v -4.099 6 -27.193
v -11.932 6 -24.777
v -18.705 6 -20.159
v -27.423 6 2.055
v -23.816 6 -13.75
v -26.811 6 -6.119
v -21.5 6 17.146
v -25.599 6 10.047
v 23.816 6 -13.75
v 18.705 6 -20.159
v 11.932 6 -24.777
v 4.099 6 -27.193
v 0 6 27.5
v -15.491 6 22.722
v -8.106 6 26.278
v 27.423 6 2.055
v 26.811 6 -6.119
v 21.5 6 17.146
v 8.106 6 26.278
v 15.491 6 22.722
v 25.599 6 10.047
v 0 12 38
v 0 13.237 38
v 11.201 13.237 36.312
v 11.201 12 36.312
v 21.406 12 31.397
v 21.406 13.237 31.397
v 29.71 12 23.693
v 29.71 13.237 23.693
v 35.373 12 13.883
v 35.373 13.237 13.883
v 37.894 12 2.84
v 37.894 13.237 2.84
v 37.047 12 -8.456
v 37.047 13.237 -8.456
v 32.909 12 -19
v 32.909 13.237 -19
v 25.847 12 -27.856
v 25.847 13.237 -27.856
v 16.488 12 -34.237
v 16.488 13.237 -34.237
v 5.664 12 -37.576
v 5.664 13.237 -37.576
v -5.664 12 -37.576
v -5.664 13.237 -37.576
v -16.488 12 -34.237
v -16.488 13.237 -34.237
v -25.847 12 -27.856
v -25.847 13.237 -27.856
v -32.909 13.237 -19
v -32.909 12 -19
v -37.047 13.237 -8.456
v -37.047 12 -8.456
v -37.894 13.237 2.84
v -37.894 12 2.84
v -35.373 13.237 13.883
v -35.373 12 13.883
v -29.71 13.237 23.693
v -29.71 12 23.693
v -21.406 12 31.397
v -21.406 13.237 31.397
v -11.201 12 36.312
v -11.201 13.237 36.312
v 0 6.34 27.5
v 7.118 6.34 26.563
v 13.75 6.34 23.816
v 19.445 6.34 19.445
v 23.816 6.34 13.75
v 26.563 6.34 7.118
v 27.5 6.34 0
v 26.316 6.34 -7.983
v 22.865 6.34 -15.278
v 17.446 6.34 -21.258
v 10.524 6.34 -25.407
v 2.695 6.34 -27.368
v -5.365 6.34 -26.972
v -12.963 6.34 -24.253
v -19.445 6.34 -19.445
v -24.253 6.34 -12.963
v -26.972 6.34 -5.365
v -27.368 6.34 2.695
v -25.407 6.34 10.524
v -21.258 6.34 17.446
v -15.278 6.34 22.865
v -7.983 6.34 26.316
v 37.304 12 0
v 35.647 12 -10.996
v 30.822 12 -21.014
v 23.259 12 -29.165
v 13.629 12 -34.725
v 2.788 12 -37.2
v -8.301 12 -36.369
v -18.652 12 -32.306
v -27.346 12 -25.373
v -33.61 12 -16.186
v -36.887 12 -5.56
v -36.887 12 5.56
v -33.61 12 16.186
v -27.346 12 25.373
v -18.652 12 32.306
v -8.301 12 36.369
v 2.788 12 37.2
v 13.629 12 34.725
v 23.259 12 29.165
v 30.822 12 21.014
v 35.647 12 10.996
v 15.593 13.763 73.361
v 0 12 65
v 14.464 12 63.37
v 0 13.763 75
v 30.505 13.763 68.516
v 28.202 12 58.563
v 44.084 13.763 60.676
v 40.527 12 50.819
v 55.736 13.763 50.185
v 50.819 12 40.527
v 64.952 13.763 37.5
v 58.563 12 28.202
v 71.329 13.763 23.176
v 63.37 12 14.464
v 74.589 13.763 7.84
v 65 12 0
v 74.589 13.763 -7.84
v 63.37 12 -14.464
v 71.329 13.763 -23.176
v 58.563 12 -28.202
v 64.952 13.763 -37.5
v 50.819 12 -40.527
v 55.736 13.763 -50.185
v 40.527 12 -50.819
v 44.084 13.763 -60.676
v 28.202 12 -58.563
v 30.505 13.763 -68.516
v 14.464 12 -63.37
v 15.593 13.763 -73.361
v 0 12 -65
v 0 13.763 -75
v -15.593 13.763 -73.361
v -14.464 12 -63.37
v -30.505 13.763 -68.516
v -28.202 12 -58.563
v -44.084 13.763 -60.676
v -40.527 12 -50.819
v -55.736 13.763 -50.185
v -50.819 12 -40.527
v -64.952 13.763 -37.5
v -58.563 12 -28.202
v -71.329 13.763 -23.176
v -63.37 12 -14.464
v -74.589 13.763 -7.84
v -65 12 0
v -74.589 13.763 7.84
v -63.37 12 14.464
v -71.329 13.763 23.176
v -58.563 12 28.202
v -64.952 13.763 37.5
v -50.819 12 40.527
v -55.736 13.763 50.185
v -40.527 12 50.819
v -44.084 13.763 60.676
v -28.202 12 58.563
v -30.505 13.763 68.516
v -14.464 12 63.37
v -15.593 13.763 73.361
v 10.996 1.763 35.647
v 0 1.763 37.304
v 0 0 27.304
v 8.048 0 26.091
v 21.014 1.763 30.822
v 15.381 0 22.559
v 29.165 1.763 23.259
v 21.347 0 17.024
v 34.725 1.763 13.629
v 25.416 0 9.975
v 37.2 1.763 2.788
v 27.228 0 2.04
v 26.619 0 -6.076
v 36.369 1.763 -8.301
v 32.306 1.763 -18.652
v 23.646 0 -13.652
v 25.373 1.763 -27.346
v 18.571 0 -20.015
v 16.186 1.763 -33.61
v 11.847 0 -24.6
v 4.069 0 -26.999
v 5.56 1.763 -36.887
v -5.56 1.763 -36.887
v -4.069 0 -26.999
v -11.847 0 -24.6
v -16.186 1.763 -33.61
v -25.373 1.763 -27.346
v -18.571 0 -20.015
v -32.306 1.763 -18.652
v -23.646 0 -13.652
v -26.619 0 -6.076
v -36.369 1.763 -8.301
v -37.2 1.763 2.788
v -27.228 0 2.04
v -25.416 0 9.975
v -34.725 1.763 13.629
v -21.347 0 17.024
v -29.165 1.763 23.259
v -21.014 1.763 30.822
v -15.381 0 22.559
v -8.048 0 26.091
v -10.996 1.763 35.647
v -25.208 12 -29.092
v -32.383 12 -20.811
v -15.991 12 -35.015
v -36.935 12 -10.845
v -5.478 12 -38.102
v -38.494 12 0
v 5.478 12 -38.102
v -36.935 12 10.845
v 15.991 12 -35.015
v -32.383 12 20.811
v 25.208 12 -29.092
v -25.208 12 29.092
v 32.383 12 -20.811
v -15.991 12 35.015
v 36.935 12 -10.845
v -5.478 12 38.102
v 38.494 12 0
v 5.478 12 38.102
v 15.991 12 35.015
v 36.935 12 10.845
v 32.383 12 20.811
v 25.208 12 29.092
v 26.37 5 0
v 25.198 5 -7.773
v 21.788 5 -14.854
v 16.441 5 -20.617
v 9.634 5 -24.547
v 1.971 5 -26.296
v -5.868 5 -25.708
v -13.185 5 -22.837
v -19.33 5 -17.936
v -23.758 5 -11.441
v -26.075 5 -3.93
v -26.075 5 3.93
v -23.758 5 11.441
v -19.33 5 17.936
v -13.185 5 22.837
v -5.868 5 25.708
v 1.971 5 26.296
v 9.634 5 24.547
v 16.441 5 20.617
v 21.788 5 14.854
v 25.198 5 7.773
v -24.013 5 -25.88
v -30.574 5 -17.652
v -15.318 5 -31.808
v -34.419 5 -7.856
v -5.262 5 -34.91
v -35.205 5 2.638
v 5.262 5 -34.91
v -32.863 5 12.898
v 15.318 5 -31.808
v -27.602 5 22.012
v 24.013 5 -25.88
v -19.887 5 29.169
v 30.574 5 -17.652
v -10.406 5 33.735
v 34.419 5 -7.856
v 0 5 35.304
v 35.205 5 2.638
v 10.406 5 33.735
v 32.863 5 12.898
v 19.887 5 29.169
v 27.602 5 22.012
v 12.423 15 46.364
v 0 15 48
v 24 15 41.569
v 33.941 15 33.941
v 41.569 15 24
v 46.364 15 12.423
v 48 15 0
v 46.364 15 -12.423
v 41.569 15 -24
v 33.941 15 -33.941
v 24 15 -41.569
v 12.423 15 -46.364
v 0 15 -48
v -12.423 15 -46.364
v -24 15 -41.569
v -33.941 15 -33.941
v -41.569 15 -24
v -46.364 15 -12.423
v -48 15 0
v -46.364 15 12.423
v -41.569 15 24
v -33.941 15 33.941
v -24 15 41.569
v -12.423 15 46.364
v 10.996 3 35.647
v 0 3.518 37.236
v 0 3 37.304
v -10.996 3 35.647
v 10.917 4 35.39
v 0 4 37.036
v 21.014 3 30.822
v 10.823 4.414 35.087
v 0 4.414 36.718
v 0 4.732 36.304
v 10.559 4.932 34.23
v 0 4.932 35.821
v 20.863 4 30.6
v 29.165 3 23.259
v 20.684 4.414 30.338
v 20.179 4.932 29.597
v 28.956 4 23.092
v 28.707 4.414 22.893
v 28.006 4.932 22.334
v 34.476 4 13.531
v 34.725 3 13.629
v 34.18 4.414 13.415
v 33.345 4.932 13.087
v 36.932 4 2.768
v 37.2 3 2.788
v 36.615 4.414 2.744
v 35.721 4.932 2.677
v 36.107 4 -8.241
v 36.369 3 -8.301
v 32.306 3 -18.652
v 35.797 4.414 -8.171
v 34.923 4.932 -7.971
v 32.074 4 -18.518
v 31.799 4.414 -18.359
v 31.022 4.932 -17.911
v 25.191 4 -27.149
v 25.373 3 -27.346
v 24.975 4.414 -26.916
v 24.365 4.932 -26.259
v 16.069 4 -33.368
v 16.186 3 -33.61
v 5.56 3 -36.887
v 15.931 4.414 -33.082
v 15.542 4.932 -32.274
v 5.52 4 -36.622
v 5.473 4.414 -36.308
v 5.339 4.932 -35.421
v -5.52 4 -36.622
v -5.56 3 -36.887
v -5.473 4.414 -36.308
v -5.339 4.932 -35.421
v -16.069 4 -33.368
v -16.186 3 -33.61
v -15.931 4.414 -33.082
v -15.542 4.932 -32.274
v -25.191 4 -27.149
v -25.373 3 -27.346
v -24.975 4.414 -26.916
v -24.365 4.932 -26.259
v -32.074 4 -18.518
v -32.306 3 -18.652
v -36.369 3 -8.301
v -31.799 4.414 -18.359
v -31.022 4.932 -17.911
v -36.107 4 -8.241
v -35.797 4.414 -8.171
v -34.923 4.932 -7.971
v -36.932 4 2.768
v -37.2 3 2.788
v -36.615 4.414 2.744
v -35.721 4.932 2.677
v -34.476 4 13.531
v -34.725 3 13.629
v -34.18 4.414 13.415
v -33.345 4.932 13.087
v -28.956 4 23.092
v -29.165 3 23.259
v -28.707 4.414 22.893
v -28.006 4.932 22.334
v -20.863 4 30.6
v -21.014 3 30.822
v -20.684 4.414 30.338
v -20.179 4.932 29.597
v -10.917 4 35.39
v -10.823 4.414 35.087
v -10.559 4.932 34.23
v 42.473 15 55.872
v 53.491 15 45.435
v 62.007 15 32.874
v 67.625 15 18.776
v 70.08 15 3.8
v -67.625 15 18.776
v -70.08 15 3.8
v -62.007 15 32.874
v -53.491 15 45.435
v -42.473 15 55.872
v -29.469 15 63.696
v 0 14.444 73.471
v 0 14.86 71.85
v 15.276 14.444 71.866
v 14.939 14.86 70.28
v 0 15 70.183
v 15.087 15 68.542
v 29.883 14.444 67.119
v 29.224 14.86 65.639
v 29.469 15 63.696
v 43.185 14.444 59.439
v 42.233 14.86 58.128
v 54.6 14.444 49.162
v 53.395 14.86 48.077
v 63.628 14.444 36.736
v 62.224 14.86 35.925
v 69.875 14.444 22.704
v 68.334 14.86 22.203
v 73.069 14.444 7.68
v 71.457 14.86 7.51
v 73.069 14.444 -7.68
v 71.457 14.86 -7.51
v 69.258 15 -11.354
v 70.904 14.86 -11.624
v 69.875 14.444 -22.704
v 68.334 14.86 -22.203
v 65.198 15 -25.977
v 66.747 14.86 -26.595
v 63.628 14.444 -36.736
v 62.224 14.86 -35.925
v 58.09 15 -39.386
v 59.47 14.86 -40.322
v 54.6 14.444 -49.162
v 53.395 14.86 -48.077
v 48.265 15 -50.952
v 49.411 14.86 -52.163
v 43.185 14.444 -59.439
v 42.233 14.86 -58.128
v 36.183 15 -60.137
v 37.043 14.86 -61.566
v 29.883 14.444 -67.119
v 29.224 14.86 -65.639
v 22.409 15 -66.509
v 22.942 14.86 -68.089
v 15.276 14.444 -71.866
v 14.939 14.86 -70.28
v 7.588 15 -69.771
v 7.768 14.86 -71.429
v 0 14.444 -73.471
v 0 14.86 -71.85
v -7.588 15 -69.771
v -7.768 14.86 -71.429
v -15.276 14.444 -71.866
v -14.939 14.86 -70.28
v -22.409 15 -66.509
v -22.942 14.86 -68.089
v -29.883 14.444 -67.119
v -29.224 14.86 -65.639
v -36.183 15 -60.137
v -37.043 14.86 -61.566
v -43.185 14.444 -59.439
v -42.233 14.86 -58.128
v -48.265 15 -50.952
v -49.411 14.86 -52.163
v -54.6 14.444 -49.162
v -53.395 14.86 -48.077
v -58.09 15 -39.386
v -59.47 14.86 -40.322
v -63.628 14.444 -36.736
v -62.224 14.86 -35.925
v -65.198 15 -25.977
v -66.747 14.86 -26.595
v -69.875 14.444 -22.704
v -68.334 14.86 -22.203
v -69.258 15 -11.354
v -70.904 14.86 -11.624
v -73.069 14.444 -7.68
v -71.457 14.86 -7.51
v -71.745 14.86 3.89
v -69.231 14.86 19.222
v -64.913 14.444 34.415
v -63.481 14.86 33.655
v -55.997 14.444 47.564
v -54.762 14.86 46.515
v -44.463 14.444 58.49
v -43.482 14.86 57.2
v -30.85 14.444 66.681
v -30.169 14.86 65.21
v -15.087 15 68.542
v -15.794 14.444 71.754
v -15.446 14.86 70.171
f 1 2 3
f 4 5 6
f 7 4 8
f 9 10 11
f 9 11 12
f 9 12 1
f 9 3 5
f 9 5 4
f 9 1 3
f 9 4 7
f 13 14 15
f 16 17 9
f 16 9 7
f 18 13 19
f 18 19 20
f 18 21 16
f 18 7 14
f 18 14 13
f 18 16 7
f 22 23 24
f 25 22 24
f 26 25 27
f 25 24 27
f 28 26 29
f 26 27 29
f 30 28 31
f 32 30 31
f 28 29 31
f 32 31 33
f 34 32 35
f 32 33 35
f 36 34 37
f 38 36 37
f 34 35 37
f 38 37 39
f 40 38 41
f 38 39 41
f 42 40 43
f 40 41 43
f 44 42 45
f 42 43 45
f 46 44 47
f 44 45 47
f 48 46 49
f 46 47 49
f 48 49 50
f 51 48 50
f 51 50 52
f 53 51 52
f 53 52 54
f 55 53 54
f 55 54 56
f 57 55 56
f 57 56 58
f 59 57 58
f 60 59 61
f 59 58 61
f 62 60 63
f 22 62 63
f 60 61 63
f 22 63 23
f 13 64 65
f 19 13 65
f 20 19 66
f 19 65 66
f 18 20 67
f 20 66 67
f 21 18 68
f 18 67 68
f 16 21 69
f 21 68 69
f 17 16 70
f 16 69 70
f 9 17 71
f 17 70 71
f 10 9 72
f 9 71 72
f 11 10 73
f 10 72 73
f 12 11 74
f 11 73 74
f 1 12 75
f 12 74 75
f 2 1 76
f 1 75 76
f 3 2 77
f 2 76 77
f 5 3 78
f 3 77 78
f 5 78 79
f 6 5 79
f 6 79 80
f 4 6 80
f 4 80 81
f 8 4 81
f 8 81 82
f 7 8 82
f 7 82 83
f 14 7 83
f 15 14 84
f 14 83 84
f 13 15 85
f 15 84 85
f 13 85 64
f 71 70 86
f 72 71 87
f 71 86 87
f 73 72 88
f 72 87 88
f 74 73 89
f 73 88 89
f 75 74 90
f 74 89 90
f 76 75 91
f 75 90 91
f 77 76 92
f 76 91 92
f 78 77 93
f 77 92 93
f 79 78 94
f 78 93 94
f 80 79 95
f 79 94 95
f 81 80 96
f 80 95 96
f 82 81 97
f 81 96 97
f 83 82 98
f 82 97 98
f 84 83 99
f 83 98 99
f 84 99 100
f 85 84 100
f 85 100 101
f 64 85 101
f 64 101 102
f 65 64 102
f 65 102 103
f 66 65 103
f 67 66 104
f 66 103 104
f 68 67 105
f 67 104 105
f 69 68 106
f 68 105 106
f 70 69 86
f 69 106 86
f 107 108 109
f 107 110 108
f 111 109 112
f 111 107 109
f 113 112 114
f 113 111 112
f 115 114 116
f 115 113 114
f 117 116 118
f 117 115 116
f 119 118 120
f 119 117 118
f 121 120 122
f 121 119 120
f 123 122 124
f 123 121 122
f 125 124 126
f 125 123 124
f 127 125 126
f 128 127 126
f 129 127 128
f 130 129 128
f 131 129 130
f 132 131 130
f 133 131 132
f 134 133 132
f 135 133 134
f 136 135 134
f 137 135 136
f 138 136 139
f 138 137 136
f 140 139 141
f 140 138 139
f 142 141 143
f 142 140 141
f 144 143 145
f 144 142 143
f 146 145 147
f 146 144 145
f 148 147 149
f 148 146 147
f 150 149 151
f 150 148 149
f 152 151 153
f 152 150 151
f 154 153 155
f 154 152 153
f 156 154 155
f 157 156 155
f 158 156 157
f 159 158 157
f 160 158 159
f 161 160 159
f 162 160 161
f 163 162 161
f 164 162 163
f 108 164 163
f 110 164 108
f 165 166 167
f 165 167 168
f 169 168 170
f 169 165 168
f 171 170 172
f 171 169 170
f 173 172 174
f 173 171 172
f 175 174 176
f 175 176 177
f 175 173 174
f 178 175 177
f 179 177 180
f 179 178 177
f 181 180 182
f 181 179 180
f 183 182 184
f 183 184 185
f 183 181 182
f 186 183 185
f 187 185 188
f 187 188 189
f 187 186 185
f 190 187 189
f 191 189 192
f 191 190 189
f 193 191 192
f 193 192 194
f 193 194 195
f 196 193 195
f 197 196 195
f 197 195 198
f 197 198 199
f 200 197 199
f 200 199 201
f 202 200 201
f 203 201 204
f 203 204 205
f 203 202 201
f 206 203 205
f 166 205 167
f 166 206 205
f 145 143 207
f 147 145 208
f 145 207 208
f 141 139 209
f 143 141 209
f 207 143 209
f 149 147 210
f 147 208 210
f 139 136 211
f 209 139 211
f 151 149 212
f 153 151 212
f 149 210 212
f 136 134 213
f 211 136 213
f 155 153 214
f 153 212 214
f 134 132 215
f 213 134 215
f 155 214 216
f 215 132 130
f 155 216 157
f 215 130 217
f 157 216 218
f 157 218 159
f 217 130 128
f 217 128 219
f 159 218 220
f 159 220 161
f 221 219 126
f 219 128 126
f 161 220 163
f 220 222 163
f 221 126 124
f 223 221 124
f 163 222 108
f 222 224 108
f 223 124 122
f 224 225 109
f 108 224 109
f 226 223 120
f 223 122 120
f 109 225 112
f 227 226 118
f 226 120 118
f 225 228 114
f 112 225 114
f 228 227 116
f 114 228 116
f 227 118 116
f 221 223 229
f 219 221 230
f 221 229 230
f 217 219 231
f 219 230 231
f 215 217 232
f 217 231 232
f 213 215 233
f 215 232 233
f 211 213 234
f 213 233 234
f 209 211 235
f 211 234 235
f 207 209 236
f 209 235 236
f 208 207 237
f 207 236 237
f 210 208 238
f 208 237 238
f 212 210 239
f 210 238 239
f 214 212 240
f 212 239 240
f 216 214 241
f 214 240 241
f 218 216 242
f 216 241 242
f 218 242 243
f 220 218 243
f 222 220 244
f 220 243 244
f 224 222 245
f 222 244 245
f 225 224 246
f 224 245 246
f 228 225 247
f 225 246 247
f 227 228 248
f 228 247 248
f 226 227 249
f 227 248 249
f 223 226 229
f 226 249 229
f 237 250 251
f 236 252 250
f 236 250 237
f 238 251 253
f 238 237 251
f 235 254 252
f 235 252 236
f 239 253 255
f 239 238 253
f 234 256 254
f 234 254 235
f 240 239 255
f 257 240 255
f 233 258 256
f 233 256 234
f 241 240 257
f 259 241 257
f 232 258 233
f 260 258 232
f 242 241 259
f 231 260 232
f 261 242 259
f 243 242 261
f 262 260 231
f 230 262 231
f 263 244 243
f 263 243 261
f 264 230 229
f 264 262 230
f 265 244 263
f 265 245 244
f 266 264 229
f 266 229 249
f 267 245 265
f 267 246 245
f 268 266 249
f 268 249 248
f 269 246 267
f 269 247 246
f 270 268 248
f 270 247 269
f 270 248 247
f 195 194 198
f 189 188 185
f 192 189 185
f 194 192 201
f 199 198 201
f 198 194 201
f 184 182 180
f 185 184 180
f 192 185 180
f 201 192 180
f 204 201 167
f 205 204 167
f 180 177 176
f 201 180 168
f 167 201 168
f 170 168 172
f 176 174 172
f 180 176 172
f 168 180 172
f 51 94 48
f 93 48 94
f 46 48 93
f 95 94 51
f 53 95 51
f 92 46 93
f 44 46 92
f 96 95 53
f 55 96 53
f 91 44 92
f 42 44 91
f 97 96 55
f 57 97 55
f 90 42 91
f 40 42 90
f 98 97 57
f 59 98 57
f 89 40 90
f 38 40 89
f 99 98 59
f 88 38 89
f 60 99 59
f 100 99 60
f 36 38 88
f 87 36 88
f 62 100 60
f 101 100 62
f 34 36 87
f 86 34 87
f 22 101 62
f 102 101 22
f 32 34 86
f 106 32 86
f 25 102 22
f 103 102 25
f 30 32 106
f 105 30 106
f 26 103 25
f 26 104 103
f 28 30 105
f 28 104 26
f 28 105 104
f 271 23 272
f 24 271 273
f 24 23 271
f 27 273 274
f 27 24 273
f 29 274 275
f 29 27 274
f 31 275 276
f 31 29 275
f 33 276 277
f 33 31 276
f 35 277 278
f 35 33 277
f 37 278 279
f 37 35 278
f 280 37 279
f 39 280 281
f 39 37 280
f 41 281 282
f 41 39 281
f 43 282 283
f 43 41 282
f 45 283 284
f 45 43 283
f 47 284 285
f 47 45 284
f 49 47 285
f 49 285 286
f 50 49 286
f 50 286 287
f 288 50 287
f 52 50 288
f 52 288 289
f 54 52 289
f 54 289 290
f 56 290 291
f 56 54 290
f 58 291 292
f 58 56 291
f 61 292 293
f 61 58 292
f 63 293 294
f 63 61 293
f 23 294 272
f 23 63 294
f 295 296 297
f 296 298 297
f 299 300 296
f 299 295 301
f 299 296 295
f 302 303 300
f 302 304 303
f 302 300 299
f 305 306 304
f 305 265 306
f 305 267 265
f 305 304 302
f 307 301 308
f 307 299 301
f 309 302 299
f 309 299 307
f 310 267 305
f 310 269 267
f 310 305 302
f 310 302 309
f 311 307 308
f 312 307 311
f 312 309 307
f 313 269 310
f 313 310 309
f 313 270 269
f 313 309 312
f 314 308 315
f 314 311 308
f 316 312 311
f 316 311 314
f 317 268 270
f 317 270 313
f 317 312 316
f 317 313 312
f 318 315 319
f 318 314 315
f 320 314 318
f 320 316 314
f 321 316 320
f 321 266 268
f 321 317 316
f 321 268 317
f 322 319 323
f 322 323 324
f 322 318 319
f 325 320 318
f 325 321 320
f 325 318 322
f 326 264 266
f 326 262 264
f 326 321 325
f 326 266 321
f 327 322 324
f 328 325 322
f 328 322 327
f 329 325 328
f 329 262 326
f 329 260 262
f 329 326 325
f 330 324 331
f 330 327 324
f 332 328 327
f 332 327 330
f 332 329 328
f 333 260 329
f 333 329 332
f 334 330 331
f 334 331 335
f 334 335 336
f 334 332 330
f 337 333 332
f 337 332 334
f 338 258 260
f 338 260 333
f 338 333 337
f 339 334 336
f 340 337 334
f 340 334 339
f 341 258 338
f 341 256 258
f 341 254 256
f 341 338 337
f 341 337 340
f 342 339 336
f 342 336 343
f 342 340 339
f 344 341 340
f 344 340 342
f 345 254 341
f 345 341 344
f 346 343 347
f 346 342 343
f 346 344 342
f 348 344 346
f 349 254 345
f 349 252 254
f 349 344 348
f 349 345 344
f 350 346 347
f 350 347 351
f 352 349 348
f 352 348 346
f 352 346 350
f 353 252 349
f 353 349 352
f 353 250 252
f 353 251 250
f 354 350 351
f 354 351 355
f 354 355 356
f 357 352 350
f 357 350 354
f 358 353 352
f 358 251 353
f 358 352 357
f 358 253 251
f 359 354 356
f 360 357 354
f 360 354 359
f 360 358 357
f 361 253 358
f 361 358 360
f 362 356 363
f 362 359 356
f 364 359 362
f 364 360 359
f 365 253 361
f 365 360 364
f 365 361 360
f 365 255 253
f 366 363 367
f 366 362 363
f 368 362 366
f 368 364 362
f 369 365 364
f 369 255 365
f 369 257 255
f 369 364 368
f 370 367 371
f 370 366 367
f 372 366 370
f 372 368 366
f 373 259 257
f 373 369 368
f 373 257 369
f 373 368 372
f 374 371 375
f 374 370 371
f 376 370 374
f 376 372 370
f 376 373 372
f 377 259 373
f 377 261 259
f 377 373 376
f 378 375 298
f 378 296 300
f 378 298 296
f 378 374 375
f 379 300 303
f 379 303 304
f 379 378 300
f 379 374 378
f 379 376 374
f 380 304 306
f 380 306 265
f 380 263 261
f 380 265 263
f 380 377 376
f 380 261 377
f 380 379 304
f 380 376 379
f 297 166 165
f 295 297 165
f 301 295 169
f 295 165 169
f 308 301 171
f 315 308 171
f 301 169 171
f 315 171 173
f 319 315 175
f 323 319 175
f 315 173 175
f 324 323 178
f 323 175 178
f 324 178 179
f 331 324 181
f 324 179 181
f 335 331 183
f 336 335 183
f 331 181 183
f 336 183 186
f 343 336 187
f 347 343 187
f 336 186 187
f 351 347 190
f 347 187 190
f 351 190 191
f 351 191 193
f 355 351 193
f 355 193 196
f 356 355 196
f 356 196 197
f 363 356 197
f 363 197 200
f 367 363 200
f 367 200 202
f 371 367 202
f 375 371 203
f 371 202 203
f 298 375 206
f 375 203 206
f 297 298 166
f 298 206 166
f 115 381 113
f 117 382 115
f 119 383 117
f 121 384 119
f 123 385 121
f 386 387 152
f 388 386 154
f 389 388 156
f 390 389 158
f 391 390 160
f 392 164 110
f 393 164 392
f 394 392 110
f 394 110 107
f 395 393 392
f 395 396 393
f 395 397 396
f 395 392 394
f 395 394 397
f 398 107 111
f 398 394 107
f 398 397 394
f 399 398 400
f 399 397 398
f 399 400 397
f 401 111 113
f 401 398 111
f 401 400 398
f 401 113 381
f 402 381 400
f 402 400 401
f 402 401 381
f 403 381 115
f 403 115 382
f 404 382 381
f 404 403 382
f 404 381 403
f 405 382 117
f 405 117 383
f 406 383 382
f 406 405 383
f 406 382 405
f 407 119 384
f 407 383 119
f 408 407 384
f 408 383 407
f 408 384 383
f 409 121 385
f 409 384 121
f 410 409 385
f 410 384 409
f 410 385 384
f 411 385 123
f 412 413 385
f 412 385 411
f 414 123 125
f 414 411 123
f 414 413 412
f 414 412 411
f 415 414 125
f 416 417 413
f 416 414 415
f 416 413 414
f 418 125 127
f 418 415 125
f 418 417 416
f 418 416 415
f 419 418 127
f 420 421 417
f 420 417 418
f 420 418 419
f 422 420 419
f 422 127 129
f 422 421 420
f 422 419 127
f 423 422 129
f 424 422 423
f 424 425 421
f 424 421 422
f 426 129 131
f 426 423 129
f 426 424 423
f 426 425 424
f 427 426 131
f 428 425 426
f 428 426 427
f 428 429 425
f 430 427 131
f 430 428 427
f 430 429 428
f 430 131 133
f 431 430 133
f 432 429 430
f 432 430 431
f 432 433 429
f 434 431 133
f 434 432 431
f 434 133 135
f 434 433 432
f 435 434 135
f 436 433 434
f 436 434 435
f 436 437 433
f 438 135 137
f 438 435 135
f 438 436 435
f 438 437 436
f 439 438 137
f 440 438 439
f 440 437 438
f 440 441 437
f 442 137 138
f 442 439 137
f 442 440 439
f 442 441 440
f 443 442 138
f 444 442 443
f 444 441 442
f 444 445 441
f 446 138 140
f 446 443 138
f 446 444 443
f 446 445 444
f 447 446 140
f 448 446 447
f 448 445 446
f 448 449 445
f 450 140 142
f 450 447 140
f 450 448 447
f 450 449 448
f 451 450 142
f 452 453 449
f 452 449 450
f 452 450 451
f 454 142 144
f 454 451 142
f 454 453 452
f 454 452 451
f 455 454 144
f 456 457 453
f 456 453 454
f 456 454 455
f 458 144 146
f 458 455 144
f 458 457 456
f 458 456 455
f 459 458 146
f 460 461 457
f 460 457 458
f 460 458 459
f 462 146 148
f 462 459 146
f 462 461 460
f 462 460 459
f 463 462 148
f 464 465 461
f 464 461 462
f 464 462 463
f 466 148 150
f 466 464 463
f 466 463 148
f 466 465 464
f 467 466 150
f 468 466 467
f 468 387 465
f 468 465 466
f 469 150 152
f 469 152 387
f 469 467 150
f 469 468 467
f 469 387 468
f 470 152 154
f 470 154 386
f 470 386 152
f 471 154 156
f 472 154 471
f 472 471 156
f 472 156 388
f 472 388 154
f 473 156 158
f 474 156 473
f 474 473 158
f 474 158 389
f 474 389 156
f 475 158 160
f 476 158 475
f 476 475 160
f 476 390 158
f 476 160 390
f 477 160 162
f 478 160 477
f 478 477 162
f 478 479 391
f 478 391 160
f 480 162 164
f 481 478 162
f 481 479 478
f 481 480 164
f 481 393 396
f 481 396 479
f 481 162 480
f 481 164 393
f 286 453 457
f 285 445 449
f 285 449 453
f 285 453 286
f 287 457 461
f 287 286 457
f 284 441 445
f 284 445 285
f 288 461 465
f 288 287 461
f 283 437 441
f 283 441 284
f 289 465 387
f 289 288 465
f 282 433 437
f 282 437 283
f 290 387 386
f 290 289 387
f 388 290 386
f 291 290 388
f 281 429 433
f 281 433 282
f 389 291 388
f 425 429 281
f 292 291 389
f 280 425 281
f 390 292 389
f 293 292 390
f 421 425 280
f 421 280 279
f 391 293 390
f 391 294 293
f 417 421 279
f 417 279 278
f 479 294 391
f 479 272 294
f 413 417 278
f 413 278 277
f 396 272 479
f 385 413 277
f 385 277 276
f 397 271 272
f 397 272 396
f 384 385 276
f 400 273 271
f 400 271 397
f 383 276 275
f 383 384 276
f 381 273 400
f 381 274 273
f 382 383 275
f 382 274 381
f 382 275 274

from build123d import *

# Parameters (mm, degrees)
SKETCH1_R           = 41.369507048
BOSS_EXTRUDE1_DEPTH = 15
SKETCH3_R           = 27.5
CUT_EXTRUDE1_DEPTH  = 9
SKETCH4_R           = 41.369507048
CUT_EXTRUDE2_DEPTH  = 5
SKETCH5_R           = 53.188342474
BOSS_EXTRUDE2_DEPTH = 2
SKETCH6_R           = 40
CUT_EXTRUDE8_DEPTH  = 2
FILLET1_R           = 10
FILLET3_R           = 5
SKETCH7_R           = 75
BOSS_EXTRUDE3_DEPTH = 3
SKETCH8_R           = 38
CUT_EXTRUDE11_DEPTH = 3
CHAMFER4_SIZE       = 10
CHAMFER4_SIZE2      = 1.763269807
CHAMFER5_SIZE       = 10
CHAMFER5_SIZE2      = 1.763269807
FILLET5_R           = 10
SKETCH10_R          = 37.303847577
BOSS_EXTRUDE4_DEPTH = 5
CHAMFER6_SIZE       = 10
CHAMFER6_SIZE2      = 1.763269807
FILLET6_R           = 2


with BuildPart() as part:
    # Sketch1 → Boss-Extrude1 (new body)
    with BuildSketch(Plane(origin=(0, 0, 0), x_dir=(1, 0, 0), z_dir=(0, 1, 0))):
        with Locations(Location((0, 0, 0), (0, 0, 270))):
            Circle(SKETCH1_R)
    extrude(amount=BOSS_EXTRUDE1_DEPTH)

    # Sketch3 → Cut-Extrude1 (cut)
    with BuildSketch(Plane(origin=(0, 15, 0), x_dir=(1, 0, 0), z_dir=(0, 1, 0))):
        with Locations(Location((0, 0, 0), (0, 0, 270))):
            Circle(SKETCH3_R)
    extrude(amount=-CUT_EXTRUDE1_DEPTH, mode=Mode.SUBTRACT)

    # Sketch4 → Cut-Extrude2 (cut)
    with BuildSketch(Plane(origin=(0, 0, 0), x_dir=(1, 0, 0), z_dir=(0, 1, 0))):
        with Locations(Location((0, 0, 0), (0, 0, 270))):
            Circle(SKETCH4_R)
    extrude(amount=CUT_EXTRUDE2_DEPTH, mode=Mode.SUBTRACT)

    # Chamfer2: read off the stored shape, not the designer's step
    # Chamfer2 outline → Chamfer2 (revolve, cut)
    with BuildSketch(Plane.XY):
        Polygon((26.369507048, 5), (41.369507048, 5), (41.369507048, 13.660254038), align=None)
        Polygon((27.5, 6.339745962), (41.369507048, 14.34730959), (41.369507048, 15), (27.5, 15), align=None)
    revolve(axis=Axis((0, 0, 0), (0, 1, 0)), mode=Mode.SUBTRACT)

    # Sketch5 → Boss-Extrude2 (add)
    with BuildSketch(Plane(origin=(0, 15, 0), x_dir=(1, 0, 0), z_dir=(0, 1, 0))):
        with Locations(Location((0, 0, 0), (0, 0, 270))):
            Circle(SKETCH5_R)
    extrude(amount=-BOSS_EXTRUDE2_DEPTH)

    # Sketch6 → Cut-Extrude8 (cut)
    with BuildSketch(Plane(origin=(0, 15, 0), x_dir=(1, 0, 0), z_dir=(0, 1, 0))):
        with Locations(Location((0, 0, 0), (0, 0, 270))):
            Circle(SKETCH6_R)
    extrude(amount=-CUT_EXTRUDE8_DEPTH, mode=Mode.SUBTRACT)

    # Fillet1
    # the kernel refuses this fillet: 10 mm, written as the material it takes off along each edge
    with BuildSketch(Plane(origin=(0, 15, 0), x_dir=(0, 0, 1), z_dir=(-1, 0, 0))) as fillet1_piece_1:
        with BuildLine():
            CenterArc((46, -10), FILLET1_R, 90, 36.869897646)
            Line((40, -2), (39.88, -1.84))
            ThreePointArc((39.88, -1.84), (39.8, -1), (39.8, 0))
            Line((39.8, 0), (40, 0.2))
            Line((40, 0.2), (46, 0.2))
            Line((46, 0.2), (46, 0))
        make_face()
    revolve(axis=Axis((0, 15, 0), (0, 1, 0)), mode=Mode.SUBTRACT)

    # Fillet3
    # the kernel refuses this fillet: 5 mm, written as the material it takes off along each edge
    with BuildSketch(Plane(origin=(0, 15, 0), x_dir=(0, 0, 1), z_dir=(-1, 0, 0))) as fillet3_piece_1:
        with BuildLine():
            CenterArc((49.188342474, -5), FILLET3_R, 36.869897646, 53.130102354)
            Line((49.188342474, 0), (49.188342474, 0.1))
            Line((49.188342474, 0.1), (53.188342474, 0.1))
            Line((53.188342474, 0.1), (53.288342474, 0))
            ThreePointArc((53.288342474, 0), (53.288342474, -1), (53.268342474, -1.94))
            Line((53.268342474, -1.94), (53.188342474, -2))
        make_face()
    revolve(axis=Axis((0, 15, 0), (0, 1, 0)), mode=Mode.SUBTRACT)

    # Sketch7 → Boss-Extrude3 (add)
    with BuildSketch(Plane(origin=(0, 15, 0), x_dir=(1, 0, 0), z_dir=(0, 1, 0))):
        with Locations(Location((0, 0, 0), (0, 0, 270))):
            Circle(SKETCH7_R)
    extrude(amount=-BOSS_EXTRUDE3_DEPTH)

    # Sketch8 → Cut-Extrude11 (cut)
    with BuildSketch(Plane(origin=(0, 15, 0), x_dir=(1, 0, 0), z_dir=(0, 1, 0))):
        with Locations(Location((0, 0, 0), (0, 0, 270))):
            Circle(SKETCH8_R)
    extrude(amount=-CUT_EXTRUDE11_DEPTH, mode=Mode.SUBTRACT)

    # Chamfer4
    chamfer4_edges = [part.edges().sort_by_distance(p)[0] for p in [
        (0, 15, -38),
    ]]
    chamfer4_side = [part.faces().sort_by_distance(p)[0] for p in [
        (0, 15, -72.878679656),
    ]]
    chamfer(chamfer4_edges, length=CHAMFER4_SIZE, length2=CHAMFER4_SIZE2, reference=chamfer4_side[0])

    # Chamfer5
    chamfer5_edges = [part.edges().sort_by_distance(p)[0] for p in [
        (0, 12, -75),
    ]]
    chamfer5_side = [part.faces().sort_by_distance(p)[0] for p in [
        (0, 12, -72.878679656),
    ]]
    chamfer(chamfer5_edges, length=CHAMFER5_SIZE, length2=CHAMFER5_SIZE2, reference=chamfer5_side[0])

    # Fillet5
    # the kernel refuses this fillet: 10 mm, written as the material it takes off along each edge
    with BuildSketch(Plane(origin=(0, 15, 0), x_dir=(0, 0, 1), z_dir=(-1, 0, 0))) as fillet5_piece_1:
        with BuildLine():
            CenterArc((70.182832545, -10), FILLET5_R, 61.202414485, 28.797585515)
            Line((70.182832545, 0), (70.182832545, 0.2))
            Line((70.182832545, 0.2), (75, 0.2))
            Line((75, 0.2), (75.2, 0))
            ThreePointArc((75.2, 0), (75.2, -0.618365096), (75.096343349, -1.061464797))
            Line((75.096343349, -1.061464797), (75, -1.236730193))
        make_face()
    revolve(axis=Axis((0, 15, 0), (0, 1, 0)), mode=Mode.SUBTRACT)

    # Sketch10 → Boss-Extrude4 (add)
    with BuildSketch(Plane(origin=(0, 0, 0), x_dir=(1, 0, 0), z_dir=(0, 1, 0))):
        with Locations(Location((0, 0, 0), (0, 0, 270))):
            Circle(SKETCH10_R)
    extrude(amount=BOSS_EXTRUDE4_DEPTH)

    # Chamfer6
    chamfer6_edges = [part.edges().sort_by_distance(p)[0] for p in [
        (0, 0, -37.303847577),
    ]]
    chamfer6_side = [part.faces().sort_by_distance(p)[0] for p in [
        (0, 0, 0),
    ]]
    chamfer(chamfer6_edges, length=CHAMFER6_SIZE, length2=CHAMFER6_SIZE2, reference=chamfer6_side[0])

    # Fillet6
    fillet6_edges = [part.edges().sort_by_distance(p)[0] for p in [
        (0, 5, -37.303847577),
    ]]
    fillet(fillet6_edges, radius=FILLET6_R)


solid = part.part
